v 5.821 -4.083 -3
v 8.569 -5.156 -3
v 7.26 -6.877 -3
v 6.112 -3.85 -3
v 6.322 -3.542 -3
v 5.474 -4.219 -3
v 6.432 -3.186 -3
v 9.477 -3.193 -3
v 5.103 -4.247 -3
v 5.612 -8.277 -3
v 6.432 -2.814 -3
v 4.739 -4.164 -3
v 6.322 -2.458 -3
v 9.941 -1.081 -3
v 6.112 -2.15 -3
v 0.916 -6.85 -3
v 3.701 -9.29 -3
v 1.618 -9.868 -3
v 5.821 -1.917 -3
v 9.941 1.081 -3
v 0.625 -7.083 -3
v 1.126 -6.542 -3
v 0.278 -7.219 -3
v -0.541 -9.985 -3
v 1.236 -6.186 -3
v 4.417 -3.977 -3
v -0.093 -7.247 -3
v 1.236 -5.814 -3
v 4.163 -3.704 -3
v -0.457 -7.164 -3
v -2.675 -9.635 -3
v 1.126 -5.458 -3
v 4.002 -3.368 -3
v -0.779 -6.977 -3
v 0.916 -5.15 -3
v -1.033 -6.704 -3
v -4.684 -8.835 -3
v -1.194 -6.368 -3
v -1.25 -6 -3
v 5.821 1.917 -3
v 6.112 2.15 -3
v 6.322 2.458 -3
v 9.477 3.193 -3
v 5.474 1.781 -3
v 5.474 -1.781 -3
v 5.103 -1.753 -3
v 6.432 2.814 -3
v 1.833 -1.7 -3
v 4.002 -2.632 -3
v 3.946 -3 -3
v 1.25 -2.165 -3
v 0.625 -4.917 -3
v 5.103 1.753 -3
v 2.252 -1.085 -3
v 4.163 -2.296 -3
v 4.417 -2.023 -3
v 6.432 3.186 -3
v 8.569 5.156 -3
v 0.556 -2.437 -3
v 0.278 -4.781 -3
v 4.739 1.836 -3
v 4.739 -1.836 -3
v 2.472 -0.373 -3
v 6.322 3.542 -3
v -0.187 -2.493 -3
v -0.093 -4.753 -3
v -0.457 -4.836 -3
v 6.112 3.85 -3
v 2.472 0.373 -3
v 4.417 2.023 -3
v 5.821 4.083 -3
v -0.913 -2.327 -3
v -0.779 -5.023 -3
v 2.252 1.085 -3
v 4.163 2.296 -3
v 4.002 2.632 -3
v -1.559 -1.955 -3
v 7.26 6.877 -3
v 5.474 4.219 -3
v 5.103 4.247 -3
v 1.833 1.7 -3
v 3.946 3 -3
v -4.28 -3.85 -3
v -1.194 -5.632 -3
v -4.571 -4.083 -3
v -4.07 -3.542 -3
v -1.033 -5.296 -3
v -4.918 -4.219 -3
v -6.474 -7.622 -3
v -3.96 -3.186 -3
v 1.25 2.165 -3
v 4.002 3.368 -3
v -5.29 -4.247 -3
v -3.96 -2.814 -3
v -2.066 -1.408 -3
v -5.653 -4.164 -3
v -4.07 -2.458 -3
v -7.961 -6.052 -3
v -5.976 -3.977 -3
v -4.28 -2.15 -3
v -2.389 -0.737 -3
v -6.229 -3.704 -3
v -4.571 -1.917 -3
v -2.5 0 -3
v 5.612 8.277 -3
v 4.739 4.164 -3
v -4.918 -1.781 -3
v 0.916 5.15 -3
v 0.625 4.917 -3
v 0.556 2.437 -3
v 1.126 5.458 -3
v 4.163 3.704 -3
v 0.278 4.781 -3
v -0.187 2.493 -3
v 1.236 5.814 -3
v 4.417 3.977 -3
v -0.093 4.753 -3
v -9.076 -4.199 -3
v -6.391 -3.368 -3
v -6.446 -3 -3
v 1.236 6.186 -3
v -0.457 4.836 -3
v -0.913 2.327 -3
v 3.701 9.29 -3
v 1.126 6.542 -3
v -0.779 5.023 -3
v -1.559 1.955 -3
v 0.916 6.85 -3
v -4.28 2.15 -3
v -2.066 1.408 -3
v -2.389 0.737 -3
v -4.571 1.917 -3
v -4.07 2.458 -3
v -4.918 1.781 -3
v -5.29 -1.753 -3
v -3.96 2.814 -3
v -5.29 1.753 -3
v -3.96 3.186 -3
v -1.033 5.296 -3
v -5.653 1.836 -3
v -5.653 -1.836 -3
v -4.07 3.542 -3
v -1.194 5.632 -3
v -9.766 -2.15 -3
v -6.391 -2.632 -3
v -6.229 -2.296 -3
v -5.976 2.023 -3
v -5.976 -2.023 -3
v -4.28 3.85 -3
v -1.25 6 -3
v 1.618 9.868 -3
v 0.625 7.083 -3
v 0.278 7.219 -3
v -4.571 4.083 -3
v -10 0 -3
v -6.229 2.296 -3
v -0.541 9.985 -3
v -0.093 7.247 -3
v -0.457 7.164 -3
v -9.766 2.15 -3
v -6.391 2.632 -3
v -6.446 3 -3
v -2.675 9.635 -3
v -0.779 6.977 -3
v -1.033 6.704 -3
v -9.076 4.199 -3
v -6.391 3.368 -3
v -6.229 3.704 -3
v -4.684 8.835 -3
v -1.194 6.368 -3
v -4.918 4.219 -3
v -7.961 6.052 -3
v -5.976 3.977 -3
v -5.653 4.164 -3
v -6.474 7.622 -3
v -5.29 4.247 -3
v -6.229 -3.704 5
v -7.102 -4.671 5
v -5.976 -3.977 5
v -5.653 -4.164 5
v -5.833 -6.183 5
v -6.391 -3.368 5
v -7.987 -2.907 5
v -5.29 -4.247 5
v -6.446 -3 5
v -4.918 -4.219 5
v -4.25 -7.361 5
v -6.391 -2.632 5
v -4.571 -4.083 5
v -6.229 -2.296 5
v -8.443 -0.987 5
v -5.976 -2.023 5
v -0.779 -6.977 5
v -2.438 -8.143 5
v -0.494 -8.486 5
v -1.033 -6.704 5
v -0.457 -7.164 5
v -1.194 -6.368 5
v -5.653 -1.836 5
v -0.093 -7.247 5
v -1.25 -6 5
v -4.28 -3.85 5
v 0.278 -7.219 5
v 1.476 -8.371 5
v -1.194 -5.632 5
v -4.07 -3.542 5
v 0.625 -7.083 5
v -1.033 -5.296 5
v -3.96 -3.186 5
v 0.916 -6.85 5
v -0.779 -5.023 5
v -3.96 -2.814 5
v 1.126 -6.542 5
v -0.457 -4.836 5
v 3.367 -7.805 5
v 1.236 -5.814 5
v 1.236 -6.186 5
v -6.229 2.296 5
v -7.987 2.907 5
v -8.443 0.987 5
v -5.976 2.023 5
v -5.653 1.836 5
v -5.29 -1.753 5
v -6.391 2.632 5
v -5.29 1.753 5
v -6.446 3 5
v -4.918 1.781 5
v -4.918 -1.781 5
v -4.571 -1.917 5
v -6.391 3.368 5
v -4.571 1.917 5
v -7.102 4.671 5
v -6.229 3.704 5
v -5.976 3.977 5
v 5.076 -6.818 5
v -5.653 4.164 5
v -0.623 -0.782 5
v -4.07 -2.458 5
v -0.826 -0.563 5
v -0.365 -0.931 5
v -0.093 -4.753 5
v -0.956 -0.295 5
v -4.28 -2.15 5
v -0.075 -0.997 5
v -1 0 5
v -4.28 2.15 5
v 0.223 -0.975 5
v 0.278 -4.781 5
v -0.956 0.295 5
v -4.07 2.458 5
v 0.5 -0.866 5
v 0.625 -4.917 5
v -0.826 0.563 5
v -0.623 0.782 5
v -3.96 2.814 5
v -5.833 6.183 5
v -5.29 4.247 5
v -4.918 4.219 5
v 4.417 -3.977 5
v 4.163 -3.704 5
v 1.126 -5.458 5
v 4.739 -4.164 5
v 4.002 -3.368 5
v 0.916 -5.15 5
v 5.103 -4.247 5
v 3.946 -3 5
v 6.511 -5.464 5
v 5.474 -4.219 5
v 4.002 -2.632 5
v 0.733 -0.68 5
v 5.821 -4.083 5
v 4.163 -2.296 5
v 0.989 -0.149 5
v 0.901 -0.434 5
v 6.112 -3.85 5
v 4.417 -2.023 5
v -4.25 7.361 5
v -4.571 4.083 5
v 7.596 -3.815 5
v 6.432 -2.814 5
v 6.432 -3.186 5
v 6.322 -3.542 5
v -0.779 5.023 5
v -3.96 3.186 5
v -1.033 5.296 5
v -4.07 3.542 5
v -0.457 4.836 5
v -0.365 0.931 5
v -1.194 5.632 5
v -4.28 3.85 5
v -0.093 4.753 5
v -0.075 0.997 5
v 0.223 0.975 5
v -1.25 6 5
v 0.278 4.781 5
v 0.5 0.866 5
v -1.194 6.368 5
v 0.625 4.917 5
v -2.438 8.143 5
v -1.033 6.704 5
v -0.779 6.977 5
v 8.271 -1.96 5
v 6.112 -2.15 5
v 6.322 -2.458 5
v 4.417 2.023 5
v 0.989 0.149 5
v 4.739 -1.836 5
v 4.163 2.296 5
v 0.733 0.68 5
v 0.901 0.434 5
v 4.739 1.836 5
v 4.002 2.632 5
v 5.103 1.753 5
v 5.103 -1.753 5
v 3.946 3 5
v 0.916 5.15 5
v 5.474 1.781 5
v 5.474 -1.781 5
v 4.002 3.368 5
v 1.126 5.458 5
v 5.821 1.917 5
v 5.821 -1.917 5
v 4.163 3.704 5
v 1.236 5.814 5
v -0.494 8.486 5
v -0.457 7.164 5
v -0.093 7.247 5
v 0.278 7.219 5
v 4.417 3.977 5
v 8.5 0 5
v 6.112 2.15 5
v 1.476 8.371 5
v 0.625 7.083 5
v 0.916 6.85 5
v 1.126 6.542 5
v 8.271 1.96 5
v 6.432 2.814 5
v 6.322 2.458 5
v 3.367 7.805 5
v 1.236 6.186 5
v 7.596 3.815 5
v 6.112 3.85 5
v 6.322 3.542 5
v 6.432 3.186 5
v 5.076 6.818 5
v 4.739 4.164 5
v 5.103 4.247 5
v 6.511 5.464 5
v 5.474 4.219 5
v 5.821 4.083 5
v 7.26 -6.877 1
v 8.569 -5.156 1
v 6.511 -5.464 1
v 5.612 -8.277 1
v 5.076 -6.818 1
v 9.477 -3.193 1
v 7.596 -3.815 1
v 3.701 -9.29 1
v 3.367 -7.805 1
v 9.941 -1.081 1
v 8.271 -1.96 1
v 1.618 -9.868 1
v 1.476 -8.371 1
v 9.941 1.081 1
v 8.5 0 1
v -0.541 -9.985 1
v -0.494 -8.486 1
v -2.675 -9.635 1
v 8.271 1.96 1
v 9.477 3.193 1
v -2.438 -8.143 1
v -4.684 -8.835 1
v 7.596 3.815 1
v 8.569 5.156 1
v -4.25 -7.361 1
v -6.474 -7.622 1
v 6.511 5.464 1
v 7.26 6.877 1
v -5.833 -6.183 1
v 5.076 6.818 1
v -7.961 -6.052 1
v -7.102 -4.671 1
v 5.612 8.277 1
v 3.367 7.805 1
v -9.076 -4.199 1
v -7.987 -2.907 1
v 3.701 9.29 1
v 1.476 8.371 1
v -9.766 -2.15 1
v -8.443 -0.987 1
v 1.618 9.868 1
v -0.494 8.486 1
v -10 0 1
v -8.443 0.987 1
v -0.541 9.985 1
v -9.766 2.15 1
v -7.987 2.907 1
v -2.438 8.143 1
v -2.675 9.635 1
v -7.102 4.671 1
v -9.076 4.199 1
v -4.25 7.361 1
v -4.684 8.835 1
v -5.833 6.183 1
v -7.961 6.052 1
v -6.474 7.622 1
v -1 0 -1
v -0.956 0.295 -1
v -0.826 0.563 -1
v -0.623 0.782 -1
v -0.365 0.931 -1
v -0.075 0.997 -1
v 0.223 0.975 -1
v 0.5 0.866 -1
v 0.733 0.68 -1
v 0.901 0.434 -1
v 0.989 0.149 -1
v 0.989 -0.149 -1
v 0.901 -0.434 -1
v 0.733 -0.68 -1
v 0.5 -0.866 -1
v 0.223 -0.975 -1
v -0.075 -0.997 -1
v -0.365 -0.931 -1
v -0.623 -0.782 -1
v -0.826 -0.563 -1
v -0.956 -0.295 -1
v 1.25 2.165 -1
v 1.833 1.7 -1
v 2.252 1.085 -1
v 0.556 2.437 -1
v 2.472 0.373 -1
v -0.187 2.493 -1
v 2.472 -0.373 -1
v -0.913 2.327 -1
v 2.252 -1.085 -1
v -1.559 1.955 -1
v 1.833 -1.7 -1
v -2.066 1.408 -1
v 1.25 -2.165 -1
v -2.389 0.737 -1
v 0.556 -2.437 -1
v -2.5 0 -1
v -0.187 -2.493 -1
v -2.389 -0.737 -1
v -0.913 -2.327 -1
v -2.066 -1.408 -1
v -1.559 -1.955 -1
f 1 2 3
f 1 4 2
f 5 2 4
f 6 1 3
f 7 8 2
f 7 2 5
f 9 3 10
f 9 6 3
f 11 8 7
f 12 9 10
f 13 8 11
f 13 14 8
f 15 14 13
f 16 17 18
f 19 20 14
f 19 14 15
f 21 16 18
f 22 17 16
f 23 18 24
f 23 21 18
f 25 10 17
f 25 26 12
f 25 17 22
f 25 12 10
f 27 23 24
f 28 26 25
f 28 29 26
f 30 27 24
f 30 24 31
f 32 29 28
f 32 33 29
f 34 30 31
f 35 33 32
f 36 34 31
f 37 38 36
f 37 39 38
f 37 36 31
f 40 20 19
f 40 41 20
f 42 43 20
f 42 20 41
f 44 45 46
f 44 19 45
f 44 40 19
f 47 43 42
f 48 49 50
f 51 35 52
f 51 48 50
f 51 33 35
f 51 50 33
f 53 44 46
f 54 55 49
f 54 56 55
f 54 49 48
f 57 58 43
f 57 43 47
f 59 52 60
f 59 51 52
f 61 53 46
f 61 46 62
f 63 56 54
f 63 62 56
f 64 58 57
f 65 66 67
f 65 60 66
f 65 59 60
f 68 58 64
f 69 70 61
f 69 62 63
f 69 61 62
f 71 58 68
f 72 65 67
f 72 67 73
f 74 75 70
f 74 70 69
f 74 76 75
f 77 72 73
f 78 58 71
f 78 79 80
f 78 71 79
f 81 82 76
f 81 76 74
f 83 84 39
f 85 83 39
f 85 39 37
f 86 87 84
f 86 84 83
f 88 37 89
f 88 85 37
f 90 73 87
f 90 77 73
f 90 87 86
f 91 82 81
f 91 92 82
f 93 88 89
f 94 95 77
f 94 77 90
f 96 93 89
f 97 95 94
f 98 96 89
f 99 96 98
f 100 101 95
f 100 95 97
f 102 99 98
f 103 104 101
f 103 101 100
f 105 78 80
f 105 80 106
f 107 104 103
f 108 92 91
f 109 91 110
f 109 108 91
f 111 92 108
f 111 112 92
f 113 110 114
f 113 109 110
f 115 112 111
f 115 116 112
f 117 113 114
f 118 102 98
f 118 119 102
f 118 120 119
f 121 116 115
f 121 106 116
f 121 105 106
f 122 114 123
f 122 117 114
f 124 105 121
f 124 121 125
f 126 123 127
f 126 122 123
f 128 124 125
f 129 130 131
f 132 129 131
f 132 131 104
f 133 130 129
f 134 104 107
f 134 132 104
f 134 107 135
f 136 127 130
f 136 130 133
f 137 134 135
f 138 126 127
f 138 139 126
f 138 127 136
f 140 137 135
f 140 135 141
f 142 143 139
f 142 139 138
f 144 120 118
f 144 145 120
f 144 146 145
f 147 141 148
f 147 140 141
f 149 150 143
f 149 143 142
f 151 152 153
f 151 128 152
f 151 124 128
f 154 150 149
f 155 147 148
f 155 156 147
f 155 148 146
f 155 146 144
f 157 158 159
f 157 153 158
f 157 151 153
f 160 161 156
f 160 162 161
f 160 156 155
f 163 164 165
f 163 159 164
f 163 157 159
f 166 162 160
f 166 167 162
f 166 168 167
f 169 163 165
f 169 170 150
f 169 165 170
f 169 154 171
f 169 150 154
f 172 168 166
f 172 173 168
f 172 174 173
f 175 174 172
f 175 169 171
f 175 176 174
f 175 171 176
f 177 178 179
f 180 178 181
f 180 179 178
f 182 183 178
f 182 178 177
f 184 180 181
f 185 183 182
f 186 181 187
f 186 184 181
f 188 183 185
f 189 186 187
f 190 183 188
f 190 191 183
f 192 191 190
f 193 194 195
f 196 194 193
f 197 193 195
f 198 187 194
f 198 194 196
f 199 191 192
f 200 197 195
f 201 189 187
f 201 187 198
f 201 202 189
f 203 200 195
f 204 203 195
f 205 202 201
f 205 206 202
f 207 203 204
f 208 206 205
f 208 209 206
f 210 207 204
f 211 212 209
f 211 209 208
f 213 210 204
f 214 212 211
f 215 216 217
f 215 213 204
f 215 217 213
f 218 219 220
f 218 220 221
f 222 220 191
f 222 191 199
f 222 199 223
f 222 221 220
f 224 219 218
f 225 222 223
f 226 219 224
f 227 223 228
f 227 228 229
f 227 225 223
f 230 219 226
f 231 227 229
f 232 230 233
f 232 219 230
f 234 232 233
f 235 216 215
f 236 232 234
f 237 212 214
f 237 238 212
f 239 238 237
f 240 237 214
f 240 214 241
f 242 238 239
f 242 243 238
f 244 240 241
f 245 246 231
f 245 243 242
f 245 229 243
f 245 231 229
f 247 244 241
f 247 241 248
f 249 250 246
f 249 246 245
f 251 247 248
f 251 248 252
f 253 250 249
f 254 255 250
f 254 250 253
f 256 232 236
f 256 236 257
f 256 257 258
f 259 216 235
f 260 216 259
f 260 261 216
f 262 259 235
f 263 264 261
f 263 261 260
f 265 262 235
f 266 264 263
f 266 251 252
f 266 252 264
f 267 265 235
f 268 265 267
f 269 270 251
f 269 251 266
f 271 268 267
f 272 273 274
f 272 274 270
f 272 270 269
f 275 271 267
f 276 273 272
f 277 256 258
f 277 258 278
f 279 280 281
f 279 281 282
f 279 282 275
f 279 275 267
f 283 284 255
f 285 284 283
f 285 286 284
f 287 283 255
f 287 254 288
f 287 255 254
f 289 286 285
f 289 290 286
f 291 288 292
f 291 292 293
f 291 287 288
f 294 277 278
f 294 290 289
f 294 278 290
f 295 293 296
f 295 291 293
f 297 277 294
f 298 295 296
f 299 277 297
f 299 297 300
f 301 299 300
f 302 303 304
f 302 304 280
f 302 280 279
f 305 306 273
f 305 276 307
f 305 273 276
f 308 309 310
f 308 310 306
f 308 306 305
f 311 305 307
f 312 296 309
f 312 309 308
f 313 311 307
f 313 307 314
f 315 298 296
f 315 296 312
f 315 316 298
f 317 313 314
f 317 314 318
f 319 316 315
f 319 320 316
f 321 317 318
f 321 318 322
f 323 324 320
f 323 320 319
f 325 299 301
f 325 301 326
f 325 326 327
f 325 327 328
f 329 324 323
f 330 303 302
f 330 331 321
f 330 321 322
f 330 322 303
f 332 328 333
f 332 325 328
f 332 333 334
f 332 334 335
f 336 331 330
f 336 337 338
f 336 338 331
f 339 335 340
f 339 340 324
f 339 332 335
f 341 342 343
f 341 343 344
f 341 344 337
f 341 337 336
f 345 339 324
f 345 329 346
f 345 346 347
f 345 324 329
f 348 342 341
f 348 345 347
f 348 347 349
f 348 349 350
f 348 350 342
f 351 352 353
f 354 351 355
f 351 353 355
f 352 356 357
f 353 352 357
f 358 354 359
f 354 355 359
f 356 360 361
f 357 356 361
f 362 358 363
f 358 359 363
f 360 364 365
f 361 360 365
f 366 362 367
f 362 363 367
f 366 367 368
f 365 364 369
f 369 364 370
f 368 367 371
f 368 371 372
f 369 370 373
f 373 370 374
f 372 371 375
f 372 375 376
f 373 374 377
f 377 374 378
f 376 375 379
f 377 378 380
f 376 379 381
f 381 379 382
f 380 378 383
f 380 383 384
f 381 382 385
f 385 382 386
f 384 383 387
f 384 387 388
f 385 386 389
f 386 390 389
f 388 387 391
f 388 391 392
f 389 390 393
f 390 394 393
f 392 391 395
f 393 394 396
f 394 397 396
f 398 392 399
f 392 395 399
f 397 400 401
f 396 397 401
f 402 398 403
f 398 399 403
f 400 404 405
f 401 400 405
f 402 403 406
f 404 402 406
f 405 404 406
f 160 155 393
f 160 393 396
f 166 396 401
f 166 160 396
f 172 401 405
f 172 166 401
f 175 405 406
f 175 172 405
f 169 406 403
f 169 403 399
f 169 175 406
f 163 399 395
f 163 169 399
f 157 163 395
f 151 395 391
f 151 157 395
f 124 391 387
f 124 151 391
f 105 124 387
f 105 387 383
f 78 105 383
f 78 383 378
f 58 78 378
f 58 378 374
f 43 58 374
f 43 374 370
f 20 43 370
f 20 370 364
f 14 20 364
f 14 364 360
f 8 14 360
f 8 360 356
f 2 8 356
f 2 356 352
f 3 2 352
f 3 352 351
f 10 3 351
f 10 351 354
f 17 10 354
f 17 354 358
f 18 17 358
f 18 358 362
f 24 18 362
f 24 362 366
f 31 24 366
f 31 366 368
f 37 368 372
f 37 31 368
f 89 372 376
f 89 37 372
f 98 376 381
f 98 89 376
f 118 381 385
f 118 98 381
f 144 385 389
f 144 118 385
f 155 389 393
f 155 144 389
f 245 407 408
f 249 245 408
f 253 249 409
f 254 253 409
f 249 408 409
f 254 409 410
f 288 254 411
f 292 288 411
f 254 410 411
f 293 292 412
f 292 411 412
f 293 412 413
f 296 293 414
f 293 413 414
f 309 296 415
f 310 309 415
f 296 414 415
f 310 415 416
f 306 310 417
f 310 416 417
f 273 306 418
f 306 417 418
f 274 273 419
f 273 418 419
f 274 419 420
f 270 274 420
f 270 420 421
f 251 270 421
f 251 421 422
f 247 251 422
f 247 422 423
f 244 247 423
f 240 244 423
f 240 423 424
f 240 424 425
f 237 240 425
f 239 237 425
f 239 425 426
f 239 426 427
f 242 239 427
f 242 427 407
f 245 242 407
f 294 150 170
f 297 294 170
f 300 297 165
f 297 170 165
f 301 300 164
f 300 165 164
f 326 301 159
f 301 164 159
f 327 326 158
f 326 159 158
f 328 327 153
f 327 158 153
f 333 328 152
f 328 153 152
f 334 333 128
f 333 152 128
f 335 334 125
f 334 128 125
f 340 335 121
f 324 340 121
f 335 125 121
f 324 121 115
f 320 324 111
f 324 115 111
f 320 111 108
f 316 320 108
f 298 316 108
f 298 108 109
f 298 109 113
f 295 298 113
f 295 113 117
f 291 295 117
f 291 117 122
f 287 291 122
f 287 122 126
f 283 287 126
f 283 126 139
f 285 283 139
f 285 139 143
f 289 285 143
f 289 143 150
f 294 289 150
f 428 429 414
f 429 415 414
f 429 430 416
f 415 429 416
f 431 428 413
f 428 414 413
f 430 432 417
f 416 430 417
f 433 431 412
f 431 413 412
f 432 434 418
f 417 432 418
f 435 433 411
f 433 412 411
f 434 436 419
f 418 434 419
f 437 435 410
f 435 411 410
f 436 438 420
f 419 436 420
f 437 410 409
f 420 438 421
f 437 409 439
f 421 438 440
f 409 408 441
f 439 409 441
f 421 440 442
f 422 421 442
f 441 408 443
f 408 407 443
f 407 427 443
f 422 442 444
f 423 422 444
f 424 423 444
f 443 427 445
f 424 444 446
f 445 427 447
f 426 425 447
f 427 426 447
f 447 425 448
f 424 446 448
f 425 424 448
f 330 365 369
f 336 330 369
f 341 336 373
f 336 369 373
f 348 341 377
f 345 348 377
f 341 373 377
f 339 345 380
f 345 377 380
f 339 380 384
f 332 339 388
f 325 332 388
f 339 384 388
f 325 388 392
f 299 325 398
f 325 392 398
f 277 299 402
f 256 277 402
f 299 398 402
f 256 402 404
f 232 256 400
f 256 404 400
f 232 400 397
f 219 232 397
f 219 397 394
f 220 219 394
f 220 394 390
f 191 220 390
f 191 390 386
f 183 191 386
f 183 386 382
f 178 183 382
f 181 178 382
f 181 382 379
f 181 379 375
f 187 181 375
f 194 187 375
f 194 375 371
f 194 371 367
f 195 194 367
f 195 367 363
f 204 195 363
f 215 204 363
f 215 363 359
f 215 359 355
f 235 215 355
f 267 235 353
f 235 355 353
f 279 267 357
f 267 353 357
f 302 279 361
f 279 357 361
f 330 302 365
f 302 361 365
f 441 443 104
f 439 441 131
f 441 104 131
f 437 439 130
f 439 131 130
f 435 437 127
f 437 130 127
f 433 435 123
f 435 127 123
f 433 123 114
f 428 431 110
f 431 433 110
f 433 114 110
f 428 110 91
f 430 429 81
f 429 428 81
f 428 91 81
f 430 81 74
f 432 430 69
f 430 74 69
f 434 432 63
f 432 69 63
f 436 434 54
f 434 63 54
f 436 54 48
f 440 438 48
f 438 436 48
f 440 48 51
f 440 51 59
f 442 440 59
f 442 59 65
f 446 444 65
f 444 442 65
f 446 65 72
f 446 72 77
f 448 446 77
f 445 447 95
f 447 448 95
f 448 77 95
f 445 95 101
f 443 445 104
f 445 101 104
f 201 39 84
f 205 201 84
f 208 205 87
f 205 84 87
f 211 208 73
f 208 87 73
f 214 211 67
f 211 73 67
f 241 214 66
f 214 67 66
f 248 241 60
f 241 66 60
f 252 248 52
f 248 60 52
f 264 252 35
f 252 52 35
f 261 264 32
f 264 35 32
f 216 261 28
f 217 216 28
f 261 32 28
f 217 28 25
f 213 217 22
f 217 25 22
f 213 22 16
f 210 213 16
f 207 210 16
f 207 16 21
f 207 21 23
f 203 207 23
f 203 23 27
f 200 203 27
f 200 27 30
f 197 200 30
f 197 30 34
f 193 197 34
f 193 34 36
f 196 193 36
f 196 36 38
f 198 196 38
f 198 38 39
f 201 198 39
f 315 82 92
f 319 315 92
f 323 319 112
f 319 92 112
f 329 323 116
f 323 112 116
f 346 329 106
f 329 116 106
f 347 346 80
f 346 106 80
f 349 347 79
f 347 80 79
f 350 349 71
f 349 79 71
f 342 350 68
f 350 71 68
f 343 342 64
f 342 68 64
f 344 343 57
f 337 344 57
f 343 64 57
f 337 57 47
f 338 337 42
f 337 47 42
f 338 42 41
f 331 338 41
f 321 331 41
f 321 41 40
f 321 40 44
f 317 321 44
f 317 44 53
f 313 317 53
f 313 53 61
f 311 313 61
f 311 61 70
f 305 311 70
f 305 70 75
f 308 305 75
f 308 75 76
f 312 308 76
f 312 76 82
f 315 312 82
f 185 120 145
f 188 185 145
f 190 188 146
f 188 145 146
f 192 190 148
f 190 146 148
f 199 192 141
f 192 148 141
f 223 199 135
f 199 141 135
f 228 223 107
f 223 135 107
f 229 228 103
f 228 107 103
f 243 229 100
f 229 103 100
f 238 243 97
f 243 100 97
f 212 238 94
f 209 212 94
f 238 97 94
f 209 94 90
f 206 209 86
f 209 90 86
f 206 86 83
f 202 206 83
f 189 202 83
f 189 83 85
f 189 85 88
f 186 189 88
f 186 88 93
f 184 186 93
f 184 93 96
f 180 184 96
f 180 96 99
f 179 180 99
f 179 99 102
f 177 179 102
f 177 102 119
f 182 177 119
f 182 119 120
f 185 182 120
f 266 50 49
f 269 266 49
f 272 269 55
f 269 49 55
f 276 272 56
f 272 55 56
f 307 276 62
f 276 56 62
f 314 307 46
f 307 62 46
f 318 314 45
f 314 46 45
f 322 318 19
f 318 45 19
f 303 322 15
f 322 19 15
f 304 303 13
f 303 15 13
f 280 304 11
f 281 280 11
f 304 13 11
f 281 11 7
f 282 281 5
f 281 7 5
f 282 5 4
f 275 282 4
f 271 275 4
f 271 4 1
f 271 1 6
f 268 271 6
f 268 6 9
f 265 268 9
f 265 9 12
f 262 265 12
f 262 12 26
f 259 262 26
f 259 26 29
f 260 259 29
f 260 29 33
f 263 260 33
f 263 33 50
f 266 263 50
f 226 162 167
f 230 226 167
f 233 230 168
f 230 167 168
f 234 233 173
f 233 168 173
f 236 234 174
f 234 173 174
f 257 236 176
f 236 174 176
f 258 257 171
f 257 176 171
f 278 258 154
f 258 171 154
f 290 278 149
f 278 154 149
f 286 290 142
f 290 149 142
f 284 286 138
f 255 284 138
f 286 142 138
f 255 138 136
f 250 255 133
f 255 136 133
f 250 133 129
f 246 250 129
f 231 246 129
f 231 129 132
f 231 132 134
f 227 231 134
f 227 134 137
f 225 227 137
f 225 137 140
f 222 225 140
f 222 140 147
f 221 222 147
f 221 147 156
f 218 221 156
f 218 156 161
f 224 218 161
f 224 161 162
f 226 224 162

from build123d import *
from build123d.topology import SkipClean

# Parameters (mm, degrees)
SKETCH_1_R          = 8.5
SKETCH_1_R_2        = 2.5
EXTRUDE_1_DEPTH     = 5
SKETCH_2_R          = 1.25
CUT_EXTRUDE_1_DEPTH = 5
SKETCH_3_R          = 10
SKETCH_3_R_2        = 8.5
EXTRUDE_2_DEPTH     = 1
EXTRUDE_START       = 3
SKETCH_4_R          = 10
SKETCH_4_R_2        = 2.5
SKETCH_4_R_3        = 1.25
EXTRUDE_3_DEPTH     = 3
EXTRUDE_START_2     = -6
SKETCH_5_R          = 2.5
EXTRUDE_4_DEPTH     = 6
SKETCH_7_R          = 1
CUT_EXTRUDE_2_DEPTH = 10


with BuildPart() as part:
    # 草图1 → 凸台-拉伸1 (new body)
    with BuildSketch(Plane.XY):
        Circle(SKETCH_1_R)
        Circle(SKETCH_1_R_2, mode=Mode.SUBTRACT)
    extrude(amount=EXTRUDE_1_DEPTH)

    # 草图2 → 切除-拉伸1 (cut)
    with BuildSketch(Plane(origin=(0, 0, 0), x_dir=(-1, 0, 0), z_dir=(0, 0, -1))):
        with Locations((0, 6)):
            Circle(SKETCH_2_R)
        with Locations((5.196152423, 3)):
            Circle(SKETCH_2_R)
        with Locations((5.196152423, -3)):
            Circle(SKETCH_2_R)
        with Locations((0, -6)):
            Circle(SKETCH_2_R)
        with Locations((-5.196152423, -3)):
            Circle(SKETCH_2_R)
        with Locations((-5.196152423, 3)):
            Circle(SKETCH_2_R)
    extrude(amount=-CUT_EXTRUDE_1_DEPTH, mode=Mode.SUBTRACT)

    # 草图3 → 凸台-拉伸2 (add)
    with BuildSketch(Plane(origin=(0, 0, 0), x_dir=(-1, 0, 0), z_dir=(0, 0, -1))):
        Circle(SKETCH_3_R)
        Circle(SKETCH_3_R_2, mode=Mode.SUBTRACT)
    extrude(amount=-EXTRUDE_2_DEPTH)

    # 草图4 → 凸台-拉伸3 (add)
    with SkipClean():  # the faces are left unmerged after this step: merging them gives an invalid solid
        with BuildSketch(Plane(origin=(0, 0, 0), x_dir=(-1, 0, 0), z_dir=(0, 0, -1)).offset(EXTRUDE_START)):
            Circle(SKETCH_4_R)
            Circle(SKETCH_4_R_2, mode=Mode.SUBTRACT)
            with Locations((0, 6)):
                Circle(SKETCH_4_R_3, mode=Mode.SUBTRACT)
            with Locations((5.196152423, 3)):
                Circle(SKETCH_4_R_3, mode=Mode.SUBTRACT)
            with Locations((5.196152423, -3)):
                Circle(SKETCH_4_R_3, mode=Mode.SUBTRACT)
            with Locations((0, -6)):
                Circle(SKETCH_4_R_3, mode=Mode.SUBTRACT)
            with Locations((-5.196152423, -3)):
                Circle(SKETCH_4_R_3, mode=Mode.SUBTRACT)
            with Locations((-5.196152423, 3)):
                Circle(SKETCH_4_R_3, mode=Mode.SUBTRACT)
        extrude(amount=-EXTRUDE_3_DEPTH)

    # 草图5 → 凸台-拉伸4 (add)
    with BuildSketch(Plane.XY.offset(5).offset(EXTRUDE_START_2)):
        with Locations(Location((0, 0, 0), (0, 0, 180))):
            Circle(SKETCH_5_R)
    extrude(amount=EXTRUDE_4_DEPTH)

    # 草图7 → 切除-拉伸2 (cut)
    with BuildSketch(Plane(origin=(0, 0, -1), x_dir=(-1, 0, 0), z_dir=(0, 0, -1))):
        Circle(SKETCH_7_R)
    extrude(amount=-CUT_EXTRUDE_2_DEPTH, mode=Mode.SUBTRACT)


solid = part.part
